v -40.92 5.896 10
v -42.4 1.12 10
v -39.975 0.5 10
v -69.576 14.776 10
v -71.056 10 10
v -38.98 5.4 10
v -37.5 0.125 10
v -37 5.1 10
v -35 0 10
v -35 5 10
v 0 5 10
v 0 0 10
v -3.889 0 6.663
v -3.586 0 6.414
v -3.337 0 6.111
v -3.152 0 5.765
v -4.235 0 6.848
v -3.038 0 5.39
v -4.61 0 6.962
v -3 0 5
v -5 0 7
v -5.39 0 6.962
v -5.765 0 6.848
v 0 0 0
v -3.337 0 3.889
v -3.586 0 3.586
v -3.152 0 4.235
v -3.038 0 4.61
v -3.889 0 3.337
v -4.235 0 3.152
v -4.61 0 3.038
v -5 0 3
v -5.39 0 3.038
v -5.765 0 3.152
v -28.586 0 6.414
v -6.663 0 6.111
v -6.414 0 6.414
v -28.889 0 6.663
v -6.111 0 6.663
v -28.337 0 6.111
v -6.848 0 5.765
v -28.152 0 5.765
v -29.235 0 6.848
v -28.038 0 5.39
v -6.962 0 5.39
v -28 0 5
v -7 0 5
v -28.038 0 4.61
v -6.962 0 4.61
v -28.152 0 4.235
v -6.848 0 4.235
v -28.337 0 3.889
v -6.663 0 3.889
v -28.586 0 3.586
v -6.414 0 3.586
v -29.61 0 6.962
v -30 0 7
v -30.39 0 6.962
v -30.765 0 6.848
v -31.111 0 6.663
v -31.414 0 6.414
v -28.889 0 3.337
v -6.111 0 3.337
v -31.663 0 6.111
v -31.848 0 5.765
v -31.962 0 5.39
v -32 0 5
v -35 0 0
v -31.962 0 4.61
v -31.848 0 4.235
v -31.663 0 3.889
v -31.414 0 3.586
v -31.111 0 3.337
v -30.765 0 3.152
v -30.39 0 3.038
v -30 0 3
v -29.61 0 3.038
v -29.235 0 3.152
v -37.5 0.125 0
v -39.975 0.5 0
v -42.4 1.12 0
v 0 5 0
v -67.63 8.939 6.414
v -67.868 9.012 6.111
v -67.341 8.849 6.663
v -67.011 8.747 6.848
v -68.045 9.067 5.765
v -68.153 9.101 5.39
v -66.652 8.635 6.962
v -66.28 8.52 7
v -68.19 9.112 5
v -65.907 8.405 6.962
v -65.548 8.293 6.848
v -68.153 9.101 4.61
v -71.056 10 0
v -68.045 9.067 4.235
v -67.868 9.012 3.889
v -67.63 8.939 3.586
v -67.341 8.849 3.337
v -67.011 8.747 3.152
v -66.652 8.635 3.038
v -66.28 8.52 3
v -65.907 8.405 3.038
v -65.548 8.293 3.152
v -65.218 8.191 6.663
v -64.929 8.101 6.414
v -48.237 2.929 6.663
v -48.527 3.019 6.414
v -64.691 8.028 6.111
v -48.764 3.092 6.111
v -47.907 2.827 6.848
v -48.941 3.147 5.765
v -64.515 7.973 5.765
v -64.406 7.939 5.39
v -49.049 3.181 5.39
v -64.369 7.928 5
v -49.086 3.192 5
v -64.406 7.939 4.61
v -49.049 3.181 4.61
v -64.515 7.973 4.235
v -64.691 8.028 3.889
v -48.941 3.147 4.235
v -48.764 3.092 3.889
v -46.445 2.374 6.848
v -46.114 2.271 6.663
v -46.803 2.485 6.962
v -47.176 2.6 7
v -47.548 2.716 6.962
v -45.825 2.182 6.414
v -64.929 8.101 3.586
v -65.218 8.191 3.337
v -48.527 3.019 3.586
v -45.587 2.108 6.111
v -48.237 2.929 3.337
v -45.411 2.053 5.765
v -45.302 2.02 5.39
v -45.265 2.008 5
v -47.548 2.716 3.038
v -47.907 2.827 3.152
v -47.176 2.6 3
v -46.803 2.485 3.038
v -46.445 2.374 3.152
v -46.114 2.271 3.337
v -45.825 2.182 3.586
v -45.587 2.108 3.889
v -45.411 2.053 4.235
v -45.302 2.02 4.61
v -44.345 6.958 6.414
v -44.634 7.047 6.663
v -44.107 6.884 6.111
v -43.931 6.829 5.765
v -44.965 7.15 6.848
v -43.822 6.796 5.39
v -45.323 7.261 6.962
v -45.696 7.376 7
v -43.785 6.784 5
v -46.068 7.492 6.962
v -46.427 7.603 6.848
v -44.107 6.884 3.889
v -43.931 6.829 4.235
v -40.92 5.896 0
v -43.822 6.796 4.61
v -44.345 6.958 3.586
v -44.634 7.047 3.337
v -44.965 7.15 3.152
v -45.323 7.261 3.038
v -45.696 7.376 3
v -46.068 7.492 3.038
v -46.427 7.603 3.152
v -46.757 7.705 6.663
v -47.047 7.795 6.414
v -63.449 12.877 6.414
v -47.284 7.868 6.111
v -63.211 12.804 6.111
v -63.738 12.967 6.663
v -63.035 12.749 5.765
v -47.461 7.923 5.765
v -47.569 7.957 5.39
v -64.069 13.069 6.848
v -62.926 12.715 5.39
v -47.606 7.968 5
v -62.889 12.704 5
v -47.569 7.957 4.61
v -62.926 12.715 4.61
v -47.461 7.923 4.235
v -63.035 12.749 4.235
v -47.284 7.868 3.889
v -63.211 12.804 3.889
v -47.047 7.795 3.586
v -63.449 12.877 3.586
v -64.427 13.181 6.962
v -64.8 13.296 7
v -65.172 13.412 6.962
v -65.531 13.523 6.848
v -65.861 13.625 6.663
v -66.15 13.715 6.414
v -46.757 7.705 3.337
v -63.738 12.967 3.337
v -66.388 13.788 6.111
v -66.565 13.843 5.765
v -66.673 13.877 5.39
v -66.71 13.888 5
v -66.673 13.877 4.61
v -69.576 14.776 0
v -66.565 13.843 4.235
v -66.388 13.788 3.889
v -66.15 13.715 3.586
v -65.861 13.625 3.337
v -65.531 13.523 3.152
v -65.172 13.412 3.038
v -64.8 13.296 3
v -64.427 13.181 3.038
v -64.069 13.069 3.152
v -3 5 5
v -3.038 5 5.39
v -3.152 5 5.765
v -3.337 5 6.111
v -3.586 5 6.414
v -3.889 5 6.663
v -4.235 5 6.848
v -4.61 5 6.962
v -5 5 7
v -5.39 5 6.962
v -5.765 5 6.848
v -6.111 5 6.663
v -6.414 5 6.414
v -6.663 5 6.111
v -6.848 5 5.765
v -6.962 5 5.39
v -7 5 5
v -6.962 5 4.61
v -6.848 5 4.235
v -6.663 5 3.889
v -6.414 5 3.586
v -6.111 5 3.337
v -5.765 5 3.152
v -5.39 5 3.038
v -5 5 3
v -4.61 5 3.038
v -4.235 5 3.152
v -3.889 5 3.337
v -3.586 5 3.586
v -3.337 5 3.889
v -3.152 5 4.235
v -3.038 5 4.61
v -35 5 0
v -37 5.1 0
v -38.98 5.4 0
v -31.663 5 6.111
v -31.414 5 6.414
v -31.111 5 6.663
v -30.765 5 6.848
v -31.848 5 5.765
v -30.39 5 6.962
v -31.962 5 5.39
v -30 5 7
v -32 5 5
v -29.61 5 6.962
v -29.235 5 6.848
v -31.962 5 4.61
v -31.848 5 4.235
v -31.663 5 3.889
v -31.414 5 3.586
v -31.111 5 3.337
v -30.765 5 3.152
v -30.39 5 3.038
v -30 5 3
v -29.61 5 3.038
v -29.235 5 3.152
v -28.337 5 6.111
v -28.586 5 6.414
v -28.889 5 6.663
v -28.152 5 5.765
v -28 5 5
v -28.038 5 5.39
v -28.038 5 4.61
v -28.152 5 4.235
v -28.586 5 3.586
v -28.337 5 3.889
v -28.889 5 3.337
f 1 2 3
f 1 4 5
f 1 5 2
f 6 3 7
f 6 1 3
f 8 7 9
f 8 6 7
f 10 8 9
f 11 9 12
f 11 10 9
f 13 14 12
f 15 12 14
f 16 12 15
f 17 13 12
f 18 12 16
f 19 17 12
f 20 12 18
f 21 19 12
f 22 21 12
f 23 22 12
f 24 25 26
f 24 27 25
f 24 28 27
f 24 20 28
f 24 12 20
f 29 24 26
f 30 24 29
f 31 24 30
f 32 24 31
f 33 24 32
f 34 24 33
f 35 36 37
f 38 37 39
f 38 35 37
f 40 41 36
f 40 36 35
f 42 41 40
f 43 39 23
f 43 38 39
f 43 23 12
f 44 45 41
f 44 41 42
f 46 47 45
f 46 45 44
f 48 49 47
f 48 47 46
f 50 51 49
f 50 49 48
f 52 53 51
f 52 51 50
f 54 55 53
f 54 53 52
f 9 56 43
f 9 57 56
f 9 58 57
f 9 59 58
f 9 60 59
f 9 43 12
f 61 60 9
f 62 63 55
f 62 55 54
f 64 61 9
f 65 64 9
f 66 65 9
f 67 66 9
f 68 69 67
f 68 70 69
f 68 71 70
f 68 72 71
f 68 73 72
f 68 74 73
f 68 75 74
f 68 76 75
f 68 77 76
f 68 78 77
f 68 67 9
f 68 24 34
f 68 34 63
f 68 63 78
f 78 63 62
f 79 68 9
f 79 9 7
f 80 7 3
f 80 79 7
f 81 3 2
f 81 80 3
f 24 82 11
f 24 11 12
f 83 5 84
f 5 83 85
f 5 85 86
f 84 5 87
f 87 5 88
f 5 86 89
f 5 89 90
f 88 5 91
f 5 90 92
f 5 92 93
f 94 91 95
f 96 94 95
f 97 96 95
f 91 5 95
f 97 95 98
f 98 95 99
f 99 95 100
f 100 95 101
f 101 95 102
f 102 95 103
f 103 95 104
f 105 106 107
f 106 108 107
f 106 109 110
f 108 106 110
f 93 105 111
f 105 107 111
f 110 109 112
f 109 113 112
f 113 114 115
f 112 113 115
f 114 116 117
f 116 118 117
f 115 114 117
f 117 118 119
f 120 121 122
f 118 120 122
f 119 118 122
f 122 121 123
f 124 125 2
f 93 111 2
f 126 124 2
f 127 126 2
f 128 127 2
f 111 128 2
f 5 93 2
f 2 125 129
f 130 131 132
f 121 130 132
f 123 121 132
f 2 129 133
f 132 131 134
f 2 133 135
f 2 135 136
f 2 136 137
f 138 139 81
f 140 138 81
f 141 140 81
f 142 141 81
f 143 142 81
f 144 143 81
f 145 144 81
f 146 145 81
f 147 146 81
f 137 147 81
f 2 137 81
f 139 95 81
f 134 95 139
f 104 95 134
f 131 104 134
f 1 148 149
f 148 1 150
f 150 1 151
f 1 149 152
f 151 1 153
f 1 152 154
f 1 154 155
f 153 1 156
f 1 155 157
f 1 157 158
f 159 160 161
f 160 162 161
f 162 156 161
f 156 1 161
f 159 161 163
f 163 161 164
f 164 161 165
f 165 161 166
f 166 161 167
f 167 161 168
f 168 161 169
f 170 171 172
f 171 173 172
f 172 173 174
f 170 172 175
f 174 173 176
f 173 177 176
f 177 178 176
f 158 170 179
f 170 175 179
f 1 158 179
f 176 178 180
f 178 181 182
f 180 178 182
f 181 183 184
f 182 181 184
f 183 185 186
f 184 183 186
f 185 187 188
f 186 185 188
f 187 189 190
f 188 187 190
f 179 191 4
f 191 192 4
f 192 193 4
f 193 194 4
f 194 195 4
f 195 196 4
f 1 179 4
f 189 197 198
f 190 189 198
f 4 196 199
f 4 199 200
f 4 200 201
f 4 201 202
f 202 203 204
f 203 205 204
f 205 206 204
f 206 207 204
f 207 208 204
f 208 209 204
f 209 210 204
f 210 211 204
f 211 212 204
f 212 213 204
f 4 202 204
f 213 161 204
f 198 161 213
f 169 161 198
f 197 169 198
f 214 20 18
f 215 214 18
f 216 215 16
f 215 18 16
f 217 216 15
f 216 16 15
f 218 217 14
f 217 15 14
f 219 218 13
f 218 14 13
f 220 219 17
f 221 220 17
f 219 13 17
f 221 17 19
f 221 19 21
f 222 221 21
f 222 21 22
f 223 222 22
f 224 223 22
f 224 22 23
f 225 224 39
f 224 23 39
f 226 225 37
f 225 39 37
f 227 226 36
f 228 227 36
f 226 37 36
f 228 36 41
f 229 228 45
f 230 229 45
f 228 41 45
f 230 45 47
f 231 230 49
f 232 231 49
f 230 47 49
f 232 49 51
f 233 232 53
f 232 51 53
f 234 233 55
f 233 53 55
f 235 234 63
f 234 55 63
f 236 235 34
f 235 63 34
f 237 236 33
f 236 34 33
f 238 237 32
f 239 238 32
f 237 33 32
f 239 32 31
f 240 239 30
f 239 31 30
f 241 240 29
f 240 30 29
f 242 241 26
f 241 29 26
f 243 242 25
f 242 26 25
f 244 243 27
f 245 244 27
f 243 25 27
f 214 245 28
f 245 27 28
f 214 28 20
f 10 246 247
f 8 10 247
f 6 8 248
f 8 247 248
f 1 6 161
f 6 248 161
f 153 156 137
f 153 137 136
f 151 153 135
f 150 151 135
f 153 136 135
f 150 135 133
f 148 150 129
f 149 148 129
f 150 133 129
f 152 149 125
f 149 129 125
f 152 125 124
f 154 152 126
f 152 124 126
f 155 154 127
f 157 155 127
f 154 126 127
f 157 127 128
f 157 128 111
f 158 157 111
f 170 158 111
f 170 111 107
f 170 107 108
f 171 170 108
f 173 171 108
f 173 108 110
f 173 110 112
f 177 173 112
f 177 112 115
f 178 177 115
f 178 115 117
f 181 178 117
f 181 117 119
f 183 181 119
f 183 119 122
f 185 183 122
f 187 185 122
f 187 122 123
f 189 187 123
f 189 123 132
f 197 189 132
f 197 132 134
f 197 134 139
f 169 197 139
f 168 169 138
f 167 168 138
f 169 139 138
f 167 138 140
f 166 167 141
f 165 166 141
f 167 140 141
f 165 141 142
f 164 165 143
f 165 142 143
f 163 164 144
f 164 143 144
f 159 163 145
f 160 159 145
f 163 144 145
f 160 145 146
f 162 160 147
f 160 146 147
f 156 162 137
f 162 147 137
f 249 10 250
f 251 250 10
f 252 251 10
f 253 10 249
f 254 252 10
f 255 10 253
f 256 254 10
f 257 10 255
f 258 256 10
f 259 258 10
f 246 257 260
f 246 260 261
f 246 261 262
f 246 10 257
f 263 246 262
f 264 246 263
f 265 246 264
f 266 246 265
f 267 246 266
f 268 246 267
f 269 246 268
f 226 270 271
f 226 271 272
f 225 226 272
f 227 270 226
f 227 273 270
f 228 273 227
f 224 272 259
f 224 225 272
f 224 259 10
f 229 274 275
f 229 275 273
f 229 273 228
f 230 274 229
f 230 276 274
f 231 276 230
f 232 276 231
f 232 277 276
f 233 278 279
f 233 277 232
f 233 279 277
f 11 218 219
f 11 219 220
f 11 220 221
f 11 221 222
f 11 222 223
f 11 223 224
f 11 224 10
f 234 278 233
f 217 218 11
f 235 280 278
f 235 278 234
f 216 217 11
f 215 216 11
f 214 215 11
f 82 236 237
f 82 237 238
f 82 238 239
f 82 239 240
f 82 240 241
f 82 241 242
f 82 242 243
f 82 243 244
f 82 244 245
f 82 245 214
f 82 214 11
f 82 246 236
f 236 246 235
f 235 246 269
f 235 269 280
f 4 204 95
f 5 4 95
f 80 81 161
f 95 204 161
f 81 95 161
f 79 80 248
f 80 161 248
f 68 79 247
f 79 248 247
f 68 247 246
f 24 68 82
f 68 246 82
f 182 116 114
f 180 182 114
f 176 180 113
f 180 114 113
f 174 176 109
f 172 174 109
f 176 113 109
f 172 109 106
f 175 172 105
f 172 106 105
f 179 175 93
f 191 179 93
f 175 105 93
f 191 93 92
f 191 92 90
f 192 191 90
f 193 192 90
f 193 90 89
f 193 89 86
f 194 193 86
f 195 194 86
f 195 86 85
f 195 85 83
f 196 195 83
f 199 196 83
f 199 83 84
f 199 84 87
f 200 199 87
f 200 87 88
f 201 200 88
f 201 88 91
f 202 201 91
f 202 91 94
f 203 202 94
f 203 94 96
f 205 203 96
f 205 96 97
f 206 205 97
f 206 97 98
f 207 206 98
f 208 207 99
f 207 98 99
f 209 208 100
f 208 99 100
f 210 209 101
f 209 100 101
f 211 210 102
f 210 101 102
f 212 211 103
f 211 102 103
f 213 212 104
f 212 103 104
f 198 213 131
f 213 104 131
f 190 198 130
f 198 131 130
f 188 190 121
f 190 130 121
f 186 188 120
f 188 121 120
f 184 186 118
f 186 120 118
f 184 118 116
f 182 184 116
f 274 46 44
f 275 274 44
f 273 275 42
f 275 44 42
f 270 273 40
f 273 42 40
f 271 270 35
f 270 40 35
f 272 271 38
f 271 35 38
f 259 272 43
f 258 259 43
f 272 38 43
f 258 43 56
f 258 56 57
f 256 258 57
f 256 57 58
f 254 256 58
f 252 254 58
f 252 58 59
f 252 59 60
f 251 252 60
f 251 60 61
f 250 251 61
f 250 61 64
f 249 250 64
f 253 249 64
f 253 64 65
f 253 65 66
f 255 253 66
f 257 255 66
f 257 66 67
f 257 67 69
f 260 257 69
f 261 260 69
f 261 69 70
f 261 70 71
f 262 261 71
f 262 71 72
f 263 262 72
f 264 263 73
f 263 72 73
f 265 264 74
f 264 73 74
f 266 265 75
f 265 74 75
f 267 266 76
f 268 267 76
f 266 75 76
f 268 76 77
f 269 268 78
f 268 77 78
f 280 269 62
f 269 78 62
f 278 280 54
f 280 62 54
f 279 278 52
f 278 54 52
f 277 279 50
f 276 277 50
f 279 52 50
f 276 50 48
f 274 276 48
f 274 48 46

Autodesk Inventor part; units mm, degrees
ref_plane "YZ Plane" through (0, 0, 0) normal (1, 0, 0) x (0, 1, 0)
ref_plane "XZ Plane" through (0, 0, 0) normal (0, 1, 0) x (-1, 0, 0)
ref_plane "XY Plane" through (0, 0, 0) normal (0, 0, 1) x (1, 0, 0)
sketch "スケッチ1" plane through (0, 0, 0) normal (0, 0, 1) x (1, 0, 0)
  line L0 (0, 0) -> (-35, 0)
  line L1 (-35, 0) -> (-35, 5)
  line L2 (-35, 5) -> (0, 5)
  line L3 (0, 5) -> (0, 0)
  arc A0 (-42.3998, 1.1202) -> (-35, 0) centre (-35, 25) ccw
  arc A1 (-40.9198, 5.8962) -> (-35, 5) centre (-35, 25) ccw
  line L4 (-40.9198, 5.8962) -> (-42.3998, 1.1202)
  line L5 (-40.9198, 5.8962) -> (-69.5756, 14.776)
  line L6 (-69.5756, 14.776) -> (-71.0555, 10)
  line L7 (-71.0555, 10) -> (-42.3998, 1.1202)
  dimension "d3" = 5
  dimension "d4" = 5
  dimension "d6" = 20
  dimension "d7" = 35
  dimension "d8" = 10
  dimension "d23" = 30
extrude "押し出し1" add sketch "スケッチ1" along normal blind 10
sketch "スケッチ2" plane through (-42.3998, 1.1202, 0) normal (-0.295992, -0.9551904, 0) x (0.9551904, -0.295992, 0)
  line L0 (-30, 0) -> (0, 0) projected
  line L1 (0, 0) -> (0, 10) projected
  line L2 (-30, 10) -> (0, 10) projected
  line L3 (-30, 0) -> (-30, 10) projected
  circle A0 centre (-25, 5) radius 2
  circle A1 centre (-5, 5) radius 2
  point P0 (40.8315, 0)
  point P1 (0, 5)
  point P2 (-30, 5)
  dimension "d11" = 4
  dimension "d12" = 4
  dimension "d13" = 5
  dimension "d14" = 5
extrude "押し出し2" cut sketch "スケッチ2" against normal through all contours A0 | A1
sketch "スケッチ3" plane through (-35, 0, 0) normal (0, -1, 0) x (1, 0, 0)
  line L0 (0, 0) -> (35, 0) projected
  line L1 (35, 0) -> (35, 10) projected
  line L2 (0, 10) -> (35, 10) projected
  line L3 (0, 0) -> (0, 10) projected
  circle A0 centre (5, 5) radius 2
  circle A1 centre (30, 5) radius 2
  point P0 (35, 5)
  point P1 (0, 5)
  dimension "d17" = 4
  dimension "d18" = 4
  dimension "d19" = 5
  dimension "d20" = 5
extrude "押し出し3" cut sketch "スケッチ3" against normal through all contours A0 | A1
properties part number "カウンター根本1" material "アルミニウム 6061"
